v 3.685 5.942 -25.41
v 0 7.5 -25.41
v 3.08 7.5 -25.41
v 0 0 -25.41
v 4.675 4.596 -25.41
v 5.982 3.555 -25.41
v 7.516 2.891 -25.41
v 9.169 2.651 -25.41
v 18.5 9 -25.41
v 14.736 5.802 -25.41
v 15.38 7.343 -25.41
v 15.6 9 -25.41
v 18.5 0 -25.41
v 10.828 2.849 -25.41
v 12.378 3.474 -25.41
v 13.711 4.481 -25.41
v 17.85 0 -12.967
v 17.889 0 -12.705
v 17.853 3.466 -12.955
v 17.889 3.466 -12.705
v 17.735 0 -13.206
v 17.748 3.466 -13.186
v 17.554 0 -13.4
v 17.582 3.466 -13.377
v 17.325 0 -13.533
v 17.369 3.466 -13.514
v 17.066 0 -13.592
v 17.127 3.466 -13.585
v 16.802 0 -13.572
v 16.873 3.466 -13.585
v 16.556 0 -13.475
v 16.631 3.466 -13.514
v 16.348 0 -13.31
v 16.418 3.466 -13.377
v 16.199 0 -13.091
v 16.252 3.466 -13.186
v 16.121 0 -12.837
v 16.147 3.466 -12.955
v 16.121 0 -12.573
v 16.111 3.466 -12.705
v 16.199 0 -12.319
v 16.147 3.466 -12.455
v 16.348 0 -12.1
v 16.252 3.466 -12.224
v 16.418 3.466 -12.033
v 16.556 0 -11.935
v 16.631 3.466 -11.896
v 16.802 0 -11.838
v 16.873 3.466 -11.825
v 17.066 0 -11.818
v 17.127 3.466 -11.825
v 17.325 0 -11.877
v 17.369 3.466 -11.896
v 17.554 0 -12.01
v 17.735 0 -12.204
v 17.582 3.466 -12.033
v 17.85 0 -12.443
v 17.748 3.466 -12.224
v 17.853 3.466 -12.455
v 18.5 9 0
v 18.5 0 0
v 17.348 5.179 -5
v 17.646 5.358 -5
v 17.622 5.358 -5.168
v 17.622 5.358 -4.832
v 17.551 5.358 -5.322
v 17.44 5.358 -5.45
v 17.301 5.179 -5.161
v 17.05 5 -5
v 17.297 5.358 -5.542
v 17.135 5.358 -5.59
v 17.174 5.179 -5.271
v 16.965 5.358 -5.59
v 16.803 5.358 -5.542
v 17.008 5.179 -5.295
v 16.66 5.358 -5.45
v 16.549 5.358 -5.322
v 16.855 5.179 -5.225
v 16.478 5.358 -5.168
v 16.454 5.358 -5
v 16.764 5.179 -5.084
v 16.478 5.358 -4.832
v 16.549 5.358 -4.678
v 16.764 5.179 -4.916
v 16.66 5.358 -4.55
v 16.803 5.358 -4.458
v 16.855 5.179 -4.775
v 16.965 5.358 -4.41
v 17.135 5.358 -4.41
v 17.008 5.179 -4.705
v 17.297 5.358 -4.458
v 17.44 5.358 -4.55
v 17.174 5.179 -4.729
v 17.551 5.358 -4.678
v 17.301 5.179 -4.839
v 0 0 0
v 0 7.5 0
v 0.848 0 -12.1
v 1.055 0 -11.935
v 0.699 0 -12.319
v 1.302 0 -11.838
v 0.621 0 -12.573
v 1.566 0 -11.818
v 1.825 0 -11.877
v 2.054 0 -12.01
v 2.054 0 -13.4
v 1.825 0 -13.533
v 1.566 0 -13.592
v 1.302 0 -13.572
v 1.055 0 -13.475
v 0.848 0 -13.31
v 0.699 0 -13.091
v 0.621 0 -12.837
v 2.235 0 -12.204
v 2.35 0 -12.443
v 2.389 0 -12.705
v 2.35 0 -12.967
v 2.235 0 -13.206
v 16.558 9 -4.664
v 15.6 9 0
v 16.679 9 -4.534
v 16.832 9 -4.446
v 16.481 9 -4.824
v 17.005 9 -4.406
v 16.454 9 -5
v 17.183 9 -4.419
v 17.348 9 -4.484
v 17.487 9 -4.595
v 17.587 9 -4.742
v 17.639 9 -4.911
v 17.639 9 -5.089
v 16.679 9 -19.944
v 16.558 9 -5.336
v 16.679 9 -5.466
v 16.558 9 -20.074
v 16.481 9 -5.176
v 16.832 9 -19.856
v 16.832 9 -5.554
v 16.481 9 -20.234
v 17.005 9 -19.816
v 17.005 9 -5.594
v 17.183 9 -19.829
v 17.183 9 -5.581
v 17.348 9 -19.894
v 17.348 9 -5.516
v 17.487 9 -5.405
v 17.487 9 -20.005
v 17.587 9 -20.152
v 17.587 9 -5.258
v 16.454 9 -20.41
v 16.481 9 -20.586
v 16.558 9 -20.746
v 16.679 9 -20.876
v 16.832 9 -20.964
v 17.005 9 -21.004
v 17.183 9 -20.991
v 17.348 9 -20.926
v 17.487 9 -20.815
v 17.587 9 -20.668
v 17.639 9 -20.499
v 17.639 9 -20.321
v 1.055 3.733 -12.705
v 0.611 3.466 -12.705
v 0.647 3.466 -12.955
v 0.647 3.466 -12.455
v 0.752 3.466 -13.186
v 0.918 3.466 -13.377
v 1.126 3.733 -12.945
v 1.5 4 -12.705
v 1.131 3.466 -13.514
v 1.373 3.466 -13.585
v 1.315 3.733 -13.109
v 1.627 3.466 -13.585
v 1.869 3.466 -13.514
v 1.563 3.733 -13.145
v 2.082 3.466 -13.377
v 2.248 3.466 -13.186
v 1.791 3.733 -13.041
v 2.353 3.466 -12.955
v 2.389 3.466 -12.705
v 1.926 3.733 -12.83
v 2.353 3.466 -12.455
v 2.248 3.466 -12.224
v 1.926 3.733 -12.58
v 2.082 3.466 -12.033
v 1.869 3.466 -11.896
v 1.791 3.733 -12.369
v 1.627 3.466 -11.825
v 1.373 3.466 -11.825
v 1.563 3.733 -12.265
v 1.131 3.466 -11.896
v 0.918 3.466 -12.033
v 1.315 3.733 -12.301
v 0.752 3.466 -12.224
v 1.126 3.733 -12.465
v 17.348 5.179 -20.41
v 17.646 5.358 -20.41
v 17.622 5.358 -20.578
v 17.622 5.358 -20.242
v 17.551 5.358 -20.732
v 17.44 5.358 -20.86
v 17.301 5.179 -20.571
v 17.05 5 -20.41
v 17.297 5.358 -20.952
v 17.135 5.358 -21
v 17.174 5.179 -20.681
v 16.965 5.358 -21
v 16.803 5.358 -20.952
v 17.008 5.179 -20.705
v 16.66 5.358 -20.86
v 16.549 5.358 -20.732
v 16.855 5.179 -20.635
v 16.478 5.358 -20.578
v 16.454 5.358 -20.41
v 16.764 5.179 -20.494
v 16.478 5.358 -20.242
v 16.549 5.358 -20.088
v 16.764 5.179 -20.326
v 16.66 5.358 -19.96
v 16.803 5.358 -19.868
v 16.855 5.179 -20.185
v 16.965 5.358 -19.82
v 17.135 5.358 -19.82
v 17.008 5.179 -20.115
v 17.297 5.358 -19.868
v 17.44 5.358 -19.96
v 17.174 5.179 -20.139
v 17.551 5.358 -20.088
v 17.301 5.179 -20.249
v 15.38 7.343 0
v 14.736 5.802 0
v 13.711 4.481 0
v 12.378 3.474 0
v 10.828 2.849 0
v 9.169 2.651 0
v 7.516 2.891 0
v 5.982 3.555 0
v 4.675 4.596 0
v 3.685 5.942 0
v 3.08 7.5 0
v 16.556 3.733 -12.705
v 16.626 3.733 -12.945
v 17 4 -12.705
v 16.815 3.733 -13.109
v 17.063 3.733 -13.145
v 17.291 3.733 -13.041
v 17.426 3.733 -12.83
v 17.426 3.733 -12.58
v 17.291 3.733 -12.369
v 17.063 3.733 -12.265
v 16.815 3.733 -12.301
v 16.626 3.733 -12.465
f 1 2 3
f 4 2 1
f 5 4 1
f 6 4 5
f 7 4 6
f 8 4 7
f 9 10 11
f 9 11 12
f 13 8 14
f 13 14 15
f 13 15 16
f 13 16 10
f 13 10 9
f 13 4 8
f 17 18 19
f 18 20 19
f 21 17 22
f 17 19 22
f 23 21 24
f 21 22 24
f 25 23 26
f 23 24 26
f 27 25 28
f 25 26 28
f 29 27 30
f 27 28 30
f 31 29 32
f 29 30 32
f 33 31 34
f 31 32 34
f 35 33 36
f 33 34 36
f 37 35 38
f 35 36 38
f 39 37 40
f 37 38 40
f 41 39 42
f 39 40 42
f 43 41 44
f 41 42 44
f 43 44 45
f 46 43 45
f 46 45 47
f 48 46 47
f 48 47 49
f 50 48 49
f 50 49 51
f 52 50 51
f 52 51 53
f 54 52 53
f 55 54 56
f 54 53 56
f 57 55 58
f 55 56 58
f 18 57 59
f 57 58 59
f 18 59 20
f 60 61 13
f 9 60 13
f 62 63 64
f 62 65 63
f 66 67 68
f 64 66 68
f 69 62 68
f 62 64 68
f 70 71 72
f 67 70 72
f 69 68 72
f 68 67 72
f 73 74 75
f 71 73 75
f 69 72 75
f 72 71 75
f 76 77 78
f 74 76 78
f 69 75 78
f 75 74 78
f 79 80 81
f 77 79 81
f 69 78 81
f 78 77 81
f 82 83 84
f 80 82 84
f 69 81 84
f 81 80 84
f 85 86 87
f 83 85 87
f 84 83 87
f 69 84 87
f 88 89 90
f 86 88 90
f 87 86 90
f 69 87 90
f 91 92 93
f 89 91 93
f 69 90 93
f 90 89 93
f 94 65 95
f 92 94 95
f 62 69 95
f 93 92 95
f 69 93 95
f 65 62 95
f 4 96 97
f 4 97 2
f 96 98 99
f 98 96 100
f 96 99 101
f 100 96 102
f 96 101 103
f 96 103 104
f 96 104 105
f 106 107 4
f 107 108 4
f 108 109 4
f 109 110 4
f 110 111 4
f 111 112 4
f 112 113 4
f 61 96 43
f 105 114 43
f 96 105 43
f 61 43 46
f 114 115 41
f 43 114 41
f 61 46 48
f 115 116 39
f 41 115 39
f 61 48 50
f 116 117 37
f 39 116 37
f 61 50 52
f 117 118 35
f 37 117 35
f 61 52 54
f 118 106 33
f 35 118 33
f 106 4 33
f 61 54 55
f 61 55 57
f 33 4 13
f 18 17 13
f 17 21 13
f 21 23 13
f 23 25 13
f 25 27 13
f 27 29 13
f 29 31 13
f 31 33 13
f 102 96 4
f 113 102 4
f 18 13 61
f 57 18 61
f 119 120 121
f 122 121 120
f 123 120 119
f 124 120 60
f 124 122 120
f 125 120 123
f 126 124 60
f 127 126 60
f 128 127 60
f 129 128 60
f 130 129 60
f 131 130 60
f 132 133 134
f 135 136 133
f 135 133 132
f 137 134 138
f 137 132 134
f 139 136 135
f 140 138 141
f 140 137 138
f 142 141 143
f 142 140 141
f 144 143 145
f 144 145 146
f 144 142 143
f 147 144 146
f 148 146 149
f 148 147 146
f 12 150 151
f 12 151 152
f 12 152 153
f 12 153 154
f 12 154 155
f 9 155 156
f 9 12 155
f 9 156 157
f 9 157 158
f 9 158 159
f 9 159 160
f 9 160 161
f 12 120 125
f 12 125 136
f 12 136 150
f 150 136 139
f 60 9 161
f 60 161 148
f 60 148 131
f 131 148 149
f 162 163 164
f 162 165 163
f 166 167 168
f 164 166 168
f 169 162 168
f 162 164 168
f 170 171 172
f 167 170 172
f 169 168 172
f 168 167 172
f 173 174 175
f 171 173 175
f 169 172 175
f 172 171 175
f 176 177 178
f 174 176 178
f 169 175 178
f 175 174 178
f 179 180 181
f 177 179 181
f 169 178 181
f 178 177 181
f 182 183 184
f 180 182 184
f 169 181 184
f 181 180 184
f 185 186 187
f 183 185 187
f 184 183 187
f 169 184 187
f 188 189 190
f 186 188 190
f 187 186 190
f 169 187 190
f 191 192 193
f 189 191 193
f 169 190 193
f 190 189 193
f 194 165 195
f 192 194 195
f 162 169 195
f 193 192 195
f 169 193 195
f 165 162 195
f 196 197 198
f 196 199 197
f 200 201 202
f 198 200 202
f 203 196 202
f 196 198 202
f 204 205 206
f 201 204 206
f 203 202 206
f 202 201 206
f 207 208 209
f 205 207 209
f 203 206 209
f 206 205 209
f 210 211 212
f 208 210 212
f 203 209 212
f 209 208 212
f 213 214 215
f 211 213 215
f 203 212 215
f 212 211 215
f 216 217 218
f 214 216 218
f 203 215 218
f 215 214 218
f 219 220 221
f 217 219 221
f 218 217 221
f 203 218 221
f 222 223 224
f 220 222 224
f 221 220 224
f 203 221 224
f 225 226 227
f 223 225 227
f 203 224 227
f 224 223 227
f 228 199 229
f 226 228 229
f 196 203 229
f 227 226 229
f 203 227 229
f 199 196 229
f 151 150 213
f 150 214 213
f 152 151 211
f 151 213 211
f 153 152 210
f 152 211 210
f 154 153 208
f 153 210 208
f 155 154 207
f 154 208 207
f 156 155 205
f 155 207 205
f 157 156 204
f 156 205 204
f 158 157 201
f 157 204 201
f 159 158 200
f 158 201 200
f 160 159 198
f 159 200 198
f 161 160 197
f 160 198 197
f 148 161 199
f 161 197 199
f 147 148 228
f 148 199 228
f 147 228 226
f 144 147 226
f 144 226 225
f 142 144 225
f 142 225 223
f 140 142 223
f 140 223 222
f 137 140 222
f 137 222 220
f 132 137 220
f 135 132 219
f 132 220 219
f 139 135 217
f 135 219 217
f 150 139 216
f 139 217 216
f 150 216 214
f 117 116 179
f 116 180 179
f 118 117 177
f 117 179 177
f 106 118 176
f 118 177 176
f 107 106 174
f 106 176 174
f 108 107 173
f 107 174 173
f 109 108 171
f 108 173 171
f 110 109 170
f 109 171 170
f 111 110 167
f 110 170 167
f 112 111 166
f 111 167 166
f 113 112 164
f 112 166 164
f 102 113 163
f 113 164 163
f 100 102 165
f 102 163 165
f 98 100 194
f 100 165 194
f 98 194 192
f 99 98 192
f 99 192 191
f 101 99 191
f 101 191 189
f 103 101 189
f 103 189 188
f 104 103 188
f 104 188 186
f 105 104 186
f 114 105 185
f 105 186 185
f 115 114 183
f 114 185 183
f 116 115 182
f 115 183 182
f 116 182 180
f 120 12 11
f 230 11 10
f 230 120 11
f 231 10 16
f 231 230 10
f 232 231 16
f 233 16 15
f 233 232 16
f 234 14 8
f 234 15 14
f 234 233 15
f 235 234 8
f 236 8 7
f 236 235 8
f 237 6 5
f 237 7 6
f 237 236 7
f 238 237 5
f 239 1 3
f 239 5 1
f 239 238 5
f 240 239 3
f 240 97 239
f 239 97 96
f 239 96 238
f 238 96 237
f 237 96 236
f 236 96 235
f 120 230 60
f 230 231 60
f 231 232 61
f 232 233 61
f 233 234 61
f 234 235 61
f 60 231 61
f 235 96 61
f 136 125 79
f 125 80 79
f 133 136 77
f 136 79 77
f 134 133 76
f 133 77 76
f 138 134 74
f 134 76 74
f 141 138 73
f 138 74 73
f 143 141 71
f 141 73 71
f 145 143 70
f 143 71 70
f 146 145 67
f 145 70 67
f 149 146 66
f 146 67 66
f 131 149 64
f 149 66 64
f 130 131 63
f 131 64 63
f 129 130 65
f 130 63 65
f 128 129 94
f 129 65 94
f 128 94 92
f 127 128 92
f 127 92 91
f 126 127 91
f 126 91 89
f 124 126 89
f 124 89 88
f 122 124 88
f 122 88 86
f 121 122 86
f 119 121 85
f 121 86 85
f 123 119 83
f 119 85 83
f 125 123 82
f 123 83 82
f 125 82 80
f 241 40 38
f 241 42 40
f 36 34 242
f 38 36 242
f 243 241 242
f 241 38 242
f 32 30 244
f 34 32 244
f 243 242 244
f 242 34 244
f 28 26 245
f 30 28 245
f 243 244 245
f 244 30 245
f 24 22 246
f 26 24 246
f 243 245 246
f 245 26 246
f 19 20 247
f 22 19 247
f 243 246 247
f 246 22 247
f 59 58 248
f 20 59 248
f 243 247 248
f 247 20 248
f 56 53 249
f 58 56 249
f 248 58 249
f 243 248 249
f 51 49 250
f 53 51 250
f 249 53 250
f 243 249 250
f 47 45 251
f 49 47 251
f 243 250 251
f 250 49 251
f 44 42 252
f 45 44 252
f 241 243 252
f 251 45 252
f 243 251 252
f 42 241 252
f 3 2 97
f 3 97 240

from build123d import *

# Parameters (mm, degrees)
SKETCH2_W                 = 18.5
SKETCH2_H                 = 25.41
BOSS_EXTRUDE1_DEPTH       = 9
CUT_EXTRUDE1_DEPTH        = 25.41
F_0_80_TAPPED_HOLE1_D     = 1.19126
F_0_80_TAPPED_HOLE1_DEPTH = 3.642109389
F_0_80_TAPPED_HOLE1_TIP   = 0.357890611
CUT_EXTRUDE3_DEPTH        = 33.694312961
CUT_EXTRUDE3_DEPTH_BACK   = 25.41
F_2_56_TAPPED_HOLE3_D     = 1.778
F_2_56_TAPPED_HOLE3_DEPTH = 3.46583491
F_2_56_TAPPED_HOLE3_TIP   = 0.53416509


with BuildPart() as part:
    # Sketch2 → Boss-Extrude1 (new body)
    with BuildSketch(Plane(origin=(0, 0, 0), x_dir=(1, 0, 0), z_dir=(0, 1, 0))):
        with Locations((9.25, 12.705)):
            Rectangle(SKETCH2_W, SKETCH2_H)
    extrude(amount=BOSS_EXTRUDE1_DEPTH)

    # Sketch6 → Cut-Extrude1 (cut)
    with BuildSketch(Plane.XY):
        with BuildLine():
            Line((2.9, 9), (15.6, 9))
            ThreePointArc((15.6, 9), (9.25, 2.65), (2.9, 9))
        make_face()
    extrude(amount=-CUT_EXTRUDE1_DEPTH, mode=Mode.SUBTRACT)

    # #0-80 Tapped Hole1
    with Locations(Plane(origin=(0, 9, 0), x_dir=(1, 0, 0), z_dir=(0, 1, 0))):
        with Locations((17.05, 20.41), (17.05, 5)):
            Hole(F_0_80_TAPPED_HOLE1_D / 2, depth=F_0_80_TAPPED_HOLE1_DEPTH)
            with Locations((0, 0, -(F_0_80_TAPPED_HOLE1_DEPTH + F_0_80_TAPPED_HOLE1_TIP / 2))):  # 118° drill point
                Cone(0, F_0_80_TAPPED_HOLE1_D / 2, F_0_80_TAPPED_HOLE1_TIP, mode=Mode.SUBTRACT)

    # Sketch14 → Cut-Extrude3 (cut, two sides)
    with BuildSketch(Plane(origin=(0, 0, -25.41), x_dir=(-1, 0, 0), z_dir=(0, 0, -1))) as cut_extrude3_sk:
        Polygon((0, 60.146081223), (0, 9), (0, 7.5), (-3.246658661, 7.5), (-2.9, 9), (8.616604878, 58.832614185), (24.031387378, 159.956651774), (15.4147825, 161.270118812), align=None)
    extrude(amount=CUT_EXTRUDE3_DEPTH, mode=Mode.SUBTRACT)
    extrude(cut_extrude3_sk.sketch, amount=-CUT_EXTRUDE3_DEPTH_BACK, mode=Mode.SUBTRACT)


with BuildPart() as cut_extrude3_kept_piece:
    # of the separate pieces the step leaves, the one the design keeps (cut_extrude3_pieces_kept)
    add(part.part.solids().sort_by_distance((0, 0, 0))[0])

    # #2-56 Tapped Hole3
    with Locations(Plane(origin=(0, 0, 0), x_dir=(-1, 0, 0), z_dir=(0, -1, 0))):
        with Locations((-17, 12.705), (-1.5, 12.705)):
            Hole(F_2_56_TAPPED_HOLE3_D / 2, depth=F_2_56_TAPPED_HOLE3_DEPTH)
            with Locations((0, 0, -(F_2_56_TAPPED_HOLE3_DEPTH + F_2_56_TAPPED_HOLE3_TIP / 2))):  # 118° drill point
                Cone(0, F_2_56_TAPPED_HOLE3_D / 2, F_2_56_TAPPED_HOLE3_TIP, mode=Mode.SUBTRACT)


solid = cut_extrude3_kept_piece.part
